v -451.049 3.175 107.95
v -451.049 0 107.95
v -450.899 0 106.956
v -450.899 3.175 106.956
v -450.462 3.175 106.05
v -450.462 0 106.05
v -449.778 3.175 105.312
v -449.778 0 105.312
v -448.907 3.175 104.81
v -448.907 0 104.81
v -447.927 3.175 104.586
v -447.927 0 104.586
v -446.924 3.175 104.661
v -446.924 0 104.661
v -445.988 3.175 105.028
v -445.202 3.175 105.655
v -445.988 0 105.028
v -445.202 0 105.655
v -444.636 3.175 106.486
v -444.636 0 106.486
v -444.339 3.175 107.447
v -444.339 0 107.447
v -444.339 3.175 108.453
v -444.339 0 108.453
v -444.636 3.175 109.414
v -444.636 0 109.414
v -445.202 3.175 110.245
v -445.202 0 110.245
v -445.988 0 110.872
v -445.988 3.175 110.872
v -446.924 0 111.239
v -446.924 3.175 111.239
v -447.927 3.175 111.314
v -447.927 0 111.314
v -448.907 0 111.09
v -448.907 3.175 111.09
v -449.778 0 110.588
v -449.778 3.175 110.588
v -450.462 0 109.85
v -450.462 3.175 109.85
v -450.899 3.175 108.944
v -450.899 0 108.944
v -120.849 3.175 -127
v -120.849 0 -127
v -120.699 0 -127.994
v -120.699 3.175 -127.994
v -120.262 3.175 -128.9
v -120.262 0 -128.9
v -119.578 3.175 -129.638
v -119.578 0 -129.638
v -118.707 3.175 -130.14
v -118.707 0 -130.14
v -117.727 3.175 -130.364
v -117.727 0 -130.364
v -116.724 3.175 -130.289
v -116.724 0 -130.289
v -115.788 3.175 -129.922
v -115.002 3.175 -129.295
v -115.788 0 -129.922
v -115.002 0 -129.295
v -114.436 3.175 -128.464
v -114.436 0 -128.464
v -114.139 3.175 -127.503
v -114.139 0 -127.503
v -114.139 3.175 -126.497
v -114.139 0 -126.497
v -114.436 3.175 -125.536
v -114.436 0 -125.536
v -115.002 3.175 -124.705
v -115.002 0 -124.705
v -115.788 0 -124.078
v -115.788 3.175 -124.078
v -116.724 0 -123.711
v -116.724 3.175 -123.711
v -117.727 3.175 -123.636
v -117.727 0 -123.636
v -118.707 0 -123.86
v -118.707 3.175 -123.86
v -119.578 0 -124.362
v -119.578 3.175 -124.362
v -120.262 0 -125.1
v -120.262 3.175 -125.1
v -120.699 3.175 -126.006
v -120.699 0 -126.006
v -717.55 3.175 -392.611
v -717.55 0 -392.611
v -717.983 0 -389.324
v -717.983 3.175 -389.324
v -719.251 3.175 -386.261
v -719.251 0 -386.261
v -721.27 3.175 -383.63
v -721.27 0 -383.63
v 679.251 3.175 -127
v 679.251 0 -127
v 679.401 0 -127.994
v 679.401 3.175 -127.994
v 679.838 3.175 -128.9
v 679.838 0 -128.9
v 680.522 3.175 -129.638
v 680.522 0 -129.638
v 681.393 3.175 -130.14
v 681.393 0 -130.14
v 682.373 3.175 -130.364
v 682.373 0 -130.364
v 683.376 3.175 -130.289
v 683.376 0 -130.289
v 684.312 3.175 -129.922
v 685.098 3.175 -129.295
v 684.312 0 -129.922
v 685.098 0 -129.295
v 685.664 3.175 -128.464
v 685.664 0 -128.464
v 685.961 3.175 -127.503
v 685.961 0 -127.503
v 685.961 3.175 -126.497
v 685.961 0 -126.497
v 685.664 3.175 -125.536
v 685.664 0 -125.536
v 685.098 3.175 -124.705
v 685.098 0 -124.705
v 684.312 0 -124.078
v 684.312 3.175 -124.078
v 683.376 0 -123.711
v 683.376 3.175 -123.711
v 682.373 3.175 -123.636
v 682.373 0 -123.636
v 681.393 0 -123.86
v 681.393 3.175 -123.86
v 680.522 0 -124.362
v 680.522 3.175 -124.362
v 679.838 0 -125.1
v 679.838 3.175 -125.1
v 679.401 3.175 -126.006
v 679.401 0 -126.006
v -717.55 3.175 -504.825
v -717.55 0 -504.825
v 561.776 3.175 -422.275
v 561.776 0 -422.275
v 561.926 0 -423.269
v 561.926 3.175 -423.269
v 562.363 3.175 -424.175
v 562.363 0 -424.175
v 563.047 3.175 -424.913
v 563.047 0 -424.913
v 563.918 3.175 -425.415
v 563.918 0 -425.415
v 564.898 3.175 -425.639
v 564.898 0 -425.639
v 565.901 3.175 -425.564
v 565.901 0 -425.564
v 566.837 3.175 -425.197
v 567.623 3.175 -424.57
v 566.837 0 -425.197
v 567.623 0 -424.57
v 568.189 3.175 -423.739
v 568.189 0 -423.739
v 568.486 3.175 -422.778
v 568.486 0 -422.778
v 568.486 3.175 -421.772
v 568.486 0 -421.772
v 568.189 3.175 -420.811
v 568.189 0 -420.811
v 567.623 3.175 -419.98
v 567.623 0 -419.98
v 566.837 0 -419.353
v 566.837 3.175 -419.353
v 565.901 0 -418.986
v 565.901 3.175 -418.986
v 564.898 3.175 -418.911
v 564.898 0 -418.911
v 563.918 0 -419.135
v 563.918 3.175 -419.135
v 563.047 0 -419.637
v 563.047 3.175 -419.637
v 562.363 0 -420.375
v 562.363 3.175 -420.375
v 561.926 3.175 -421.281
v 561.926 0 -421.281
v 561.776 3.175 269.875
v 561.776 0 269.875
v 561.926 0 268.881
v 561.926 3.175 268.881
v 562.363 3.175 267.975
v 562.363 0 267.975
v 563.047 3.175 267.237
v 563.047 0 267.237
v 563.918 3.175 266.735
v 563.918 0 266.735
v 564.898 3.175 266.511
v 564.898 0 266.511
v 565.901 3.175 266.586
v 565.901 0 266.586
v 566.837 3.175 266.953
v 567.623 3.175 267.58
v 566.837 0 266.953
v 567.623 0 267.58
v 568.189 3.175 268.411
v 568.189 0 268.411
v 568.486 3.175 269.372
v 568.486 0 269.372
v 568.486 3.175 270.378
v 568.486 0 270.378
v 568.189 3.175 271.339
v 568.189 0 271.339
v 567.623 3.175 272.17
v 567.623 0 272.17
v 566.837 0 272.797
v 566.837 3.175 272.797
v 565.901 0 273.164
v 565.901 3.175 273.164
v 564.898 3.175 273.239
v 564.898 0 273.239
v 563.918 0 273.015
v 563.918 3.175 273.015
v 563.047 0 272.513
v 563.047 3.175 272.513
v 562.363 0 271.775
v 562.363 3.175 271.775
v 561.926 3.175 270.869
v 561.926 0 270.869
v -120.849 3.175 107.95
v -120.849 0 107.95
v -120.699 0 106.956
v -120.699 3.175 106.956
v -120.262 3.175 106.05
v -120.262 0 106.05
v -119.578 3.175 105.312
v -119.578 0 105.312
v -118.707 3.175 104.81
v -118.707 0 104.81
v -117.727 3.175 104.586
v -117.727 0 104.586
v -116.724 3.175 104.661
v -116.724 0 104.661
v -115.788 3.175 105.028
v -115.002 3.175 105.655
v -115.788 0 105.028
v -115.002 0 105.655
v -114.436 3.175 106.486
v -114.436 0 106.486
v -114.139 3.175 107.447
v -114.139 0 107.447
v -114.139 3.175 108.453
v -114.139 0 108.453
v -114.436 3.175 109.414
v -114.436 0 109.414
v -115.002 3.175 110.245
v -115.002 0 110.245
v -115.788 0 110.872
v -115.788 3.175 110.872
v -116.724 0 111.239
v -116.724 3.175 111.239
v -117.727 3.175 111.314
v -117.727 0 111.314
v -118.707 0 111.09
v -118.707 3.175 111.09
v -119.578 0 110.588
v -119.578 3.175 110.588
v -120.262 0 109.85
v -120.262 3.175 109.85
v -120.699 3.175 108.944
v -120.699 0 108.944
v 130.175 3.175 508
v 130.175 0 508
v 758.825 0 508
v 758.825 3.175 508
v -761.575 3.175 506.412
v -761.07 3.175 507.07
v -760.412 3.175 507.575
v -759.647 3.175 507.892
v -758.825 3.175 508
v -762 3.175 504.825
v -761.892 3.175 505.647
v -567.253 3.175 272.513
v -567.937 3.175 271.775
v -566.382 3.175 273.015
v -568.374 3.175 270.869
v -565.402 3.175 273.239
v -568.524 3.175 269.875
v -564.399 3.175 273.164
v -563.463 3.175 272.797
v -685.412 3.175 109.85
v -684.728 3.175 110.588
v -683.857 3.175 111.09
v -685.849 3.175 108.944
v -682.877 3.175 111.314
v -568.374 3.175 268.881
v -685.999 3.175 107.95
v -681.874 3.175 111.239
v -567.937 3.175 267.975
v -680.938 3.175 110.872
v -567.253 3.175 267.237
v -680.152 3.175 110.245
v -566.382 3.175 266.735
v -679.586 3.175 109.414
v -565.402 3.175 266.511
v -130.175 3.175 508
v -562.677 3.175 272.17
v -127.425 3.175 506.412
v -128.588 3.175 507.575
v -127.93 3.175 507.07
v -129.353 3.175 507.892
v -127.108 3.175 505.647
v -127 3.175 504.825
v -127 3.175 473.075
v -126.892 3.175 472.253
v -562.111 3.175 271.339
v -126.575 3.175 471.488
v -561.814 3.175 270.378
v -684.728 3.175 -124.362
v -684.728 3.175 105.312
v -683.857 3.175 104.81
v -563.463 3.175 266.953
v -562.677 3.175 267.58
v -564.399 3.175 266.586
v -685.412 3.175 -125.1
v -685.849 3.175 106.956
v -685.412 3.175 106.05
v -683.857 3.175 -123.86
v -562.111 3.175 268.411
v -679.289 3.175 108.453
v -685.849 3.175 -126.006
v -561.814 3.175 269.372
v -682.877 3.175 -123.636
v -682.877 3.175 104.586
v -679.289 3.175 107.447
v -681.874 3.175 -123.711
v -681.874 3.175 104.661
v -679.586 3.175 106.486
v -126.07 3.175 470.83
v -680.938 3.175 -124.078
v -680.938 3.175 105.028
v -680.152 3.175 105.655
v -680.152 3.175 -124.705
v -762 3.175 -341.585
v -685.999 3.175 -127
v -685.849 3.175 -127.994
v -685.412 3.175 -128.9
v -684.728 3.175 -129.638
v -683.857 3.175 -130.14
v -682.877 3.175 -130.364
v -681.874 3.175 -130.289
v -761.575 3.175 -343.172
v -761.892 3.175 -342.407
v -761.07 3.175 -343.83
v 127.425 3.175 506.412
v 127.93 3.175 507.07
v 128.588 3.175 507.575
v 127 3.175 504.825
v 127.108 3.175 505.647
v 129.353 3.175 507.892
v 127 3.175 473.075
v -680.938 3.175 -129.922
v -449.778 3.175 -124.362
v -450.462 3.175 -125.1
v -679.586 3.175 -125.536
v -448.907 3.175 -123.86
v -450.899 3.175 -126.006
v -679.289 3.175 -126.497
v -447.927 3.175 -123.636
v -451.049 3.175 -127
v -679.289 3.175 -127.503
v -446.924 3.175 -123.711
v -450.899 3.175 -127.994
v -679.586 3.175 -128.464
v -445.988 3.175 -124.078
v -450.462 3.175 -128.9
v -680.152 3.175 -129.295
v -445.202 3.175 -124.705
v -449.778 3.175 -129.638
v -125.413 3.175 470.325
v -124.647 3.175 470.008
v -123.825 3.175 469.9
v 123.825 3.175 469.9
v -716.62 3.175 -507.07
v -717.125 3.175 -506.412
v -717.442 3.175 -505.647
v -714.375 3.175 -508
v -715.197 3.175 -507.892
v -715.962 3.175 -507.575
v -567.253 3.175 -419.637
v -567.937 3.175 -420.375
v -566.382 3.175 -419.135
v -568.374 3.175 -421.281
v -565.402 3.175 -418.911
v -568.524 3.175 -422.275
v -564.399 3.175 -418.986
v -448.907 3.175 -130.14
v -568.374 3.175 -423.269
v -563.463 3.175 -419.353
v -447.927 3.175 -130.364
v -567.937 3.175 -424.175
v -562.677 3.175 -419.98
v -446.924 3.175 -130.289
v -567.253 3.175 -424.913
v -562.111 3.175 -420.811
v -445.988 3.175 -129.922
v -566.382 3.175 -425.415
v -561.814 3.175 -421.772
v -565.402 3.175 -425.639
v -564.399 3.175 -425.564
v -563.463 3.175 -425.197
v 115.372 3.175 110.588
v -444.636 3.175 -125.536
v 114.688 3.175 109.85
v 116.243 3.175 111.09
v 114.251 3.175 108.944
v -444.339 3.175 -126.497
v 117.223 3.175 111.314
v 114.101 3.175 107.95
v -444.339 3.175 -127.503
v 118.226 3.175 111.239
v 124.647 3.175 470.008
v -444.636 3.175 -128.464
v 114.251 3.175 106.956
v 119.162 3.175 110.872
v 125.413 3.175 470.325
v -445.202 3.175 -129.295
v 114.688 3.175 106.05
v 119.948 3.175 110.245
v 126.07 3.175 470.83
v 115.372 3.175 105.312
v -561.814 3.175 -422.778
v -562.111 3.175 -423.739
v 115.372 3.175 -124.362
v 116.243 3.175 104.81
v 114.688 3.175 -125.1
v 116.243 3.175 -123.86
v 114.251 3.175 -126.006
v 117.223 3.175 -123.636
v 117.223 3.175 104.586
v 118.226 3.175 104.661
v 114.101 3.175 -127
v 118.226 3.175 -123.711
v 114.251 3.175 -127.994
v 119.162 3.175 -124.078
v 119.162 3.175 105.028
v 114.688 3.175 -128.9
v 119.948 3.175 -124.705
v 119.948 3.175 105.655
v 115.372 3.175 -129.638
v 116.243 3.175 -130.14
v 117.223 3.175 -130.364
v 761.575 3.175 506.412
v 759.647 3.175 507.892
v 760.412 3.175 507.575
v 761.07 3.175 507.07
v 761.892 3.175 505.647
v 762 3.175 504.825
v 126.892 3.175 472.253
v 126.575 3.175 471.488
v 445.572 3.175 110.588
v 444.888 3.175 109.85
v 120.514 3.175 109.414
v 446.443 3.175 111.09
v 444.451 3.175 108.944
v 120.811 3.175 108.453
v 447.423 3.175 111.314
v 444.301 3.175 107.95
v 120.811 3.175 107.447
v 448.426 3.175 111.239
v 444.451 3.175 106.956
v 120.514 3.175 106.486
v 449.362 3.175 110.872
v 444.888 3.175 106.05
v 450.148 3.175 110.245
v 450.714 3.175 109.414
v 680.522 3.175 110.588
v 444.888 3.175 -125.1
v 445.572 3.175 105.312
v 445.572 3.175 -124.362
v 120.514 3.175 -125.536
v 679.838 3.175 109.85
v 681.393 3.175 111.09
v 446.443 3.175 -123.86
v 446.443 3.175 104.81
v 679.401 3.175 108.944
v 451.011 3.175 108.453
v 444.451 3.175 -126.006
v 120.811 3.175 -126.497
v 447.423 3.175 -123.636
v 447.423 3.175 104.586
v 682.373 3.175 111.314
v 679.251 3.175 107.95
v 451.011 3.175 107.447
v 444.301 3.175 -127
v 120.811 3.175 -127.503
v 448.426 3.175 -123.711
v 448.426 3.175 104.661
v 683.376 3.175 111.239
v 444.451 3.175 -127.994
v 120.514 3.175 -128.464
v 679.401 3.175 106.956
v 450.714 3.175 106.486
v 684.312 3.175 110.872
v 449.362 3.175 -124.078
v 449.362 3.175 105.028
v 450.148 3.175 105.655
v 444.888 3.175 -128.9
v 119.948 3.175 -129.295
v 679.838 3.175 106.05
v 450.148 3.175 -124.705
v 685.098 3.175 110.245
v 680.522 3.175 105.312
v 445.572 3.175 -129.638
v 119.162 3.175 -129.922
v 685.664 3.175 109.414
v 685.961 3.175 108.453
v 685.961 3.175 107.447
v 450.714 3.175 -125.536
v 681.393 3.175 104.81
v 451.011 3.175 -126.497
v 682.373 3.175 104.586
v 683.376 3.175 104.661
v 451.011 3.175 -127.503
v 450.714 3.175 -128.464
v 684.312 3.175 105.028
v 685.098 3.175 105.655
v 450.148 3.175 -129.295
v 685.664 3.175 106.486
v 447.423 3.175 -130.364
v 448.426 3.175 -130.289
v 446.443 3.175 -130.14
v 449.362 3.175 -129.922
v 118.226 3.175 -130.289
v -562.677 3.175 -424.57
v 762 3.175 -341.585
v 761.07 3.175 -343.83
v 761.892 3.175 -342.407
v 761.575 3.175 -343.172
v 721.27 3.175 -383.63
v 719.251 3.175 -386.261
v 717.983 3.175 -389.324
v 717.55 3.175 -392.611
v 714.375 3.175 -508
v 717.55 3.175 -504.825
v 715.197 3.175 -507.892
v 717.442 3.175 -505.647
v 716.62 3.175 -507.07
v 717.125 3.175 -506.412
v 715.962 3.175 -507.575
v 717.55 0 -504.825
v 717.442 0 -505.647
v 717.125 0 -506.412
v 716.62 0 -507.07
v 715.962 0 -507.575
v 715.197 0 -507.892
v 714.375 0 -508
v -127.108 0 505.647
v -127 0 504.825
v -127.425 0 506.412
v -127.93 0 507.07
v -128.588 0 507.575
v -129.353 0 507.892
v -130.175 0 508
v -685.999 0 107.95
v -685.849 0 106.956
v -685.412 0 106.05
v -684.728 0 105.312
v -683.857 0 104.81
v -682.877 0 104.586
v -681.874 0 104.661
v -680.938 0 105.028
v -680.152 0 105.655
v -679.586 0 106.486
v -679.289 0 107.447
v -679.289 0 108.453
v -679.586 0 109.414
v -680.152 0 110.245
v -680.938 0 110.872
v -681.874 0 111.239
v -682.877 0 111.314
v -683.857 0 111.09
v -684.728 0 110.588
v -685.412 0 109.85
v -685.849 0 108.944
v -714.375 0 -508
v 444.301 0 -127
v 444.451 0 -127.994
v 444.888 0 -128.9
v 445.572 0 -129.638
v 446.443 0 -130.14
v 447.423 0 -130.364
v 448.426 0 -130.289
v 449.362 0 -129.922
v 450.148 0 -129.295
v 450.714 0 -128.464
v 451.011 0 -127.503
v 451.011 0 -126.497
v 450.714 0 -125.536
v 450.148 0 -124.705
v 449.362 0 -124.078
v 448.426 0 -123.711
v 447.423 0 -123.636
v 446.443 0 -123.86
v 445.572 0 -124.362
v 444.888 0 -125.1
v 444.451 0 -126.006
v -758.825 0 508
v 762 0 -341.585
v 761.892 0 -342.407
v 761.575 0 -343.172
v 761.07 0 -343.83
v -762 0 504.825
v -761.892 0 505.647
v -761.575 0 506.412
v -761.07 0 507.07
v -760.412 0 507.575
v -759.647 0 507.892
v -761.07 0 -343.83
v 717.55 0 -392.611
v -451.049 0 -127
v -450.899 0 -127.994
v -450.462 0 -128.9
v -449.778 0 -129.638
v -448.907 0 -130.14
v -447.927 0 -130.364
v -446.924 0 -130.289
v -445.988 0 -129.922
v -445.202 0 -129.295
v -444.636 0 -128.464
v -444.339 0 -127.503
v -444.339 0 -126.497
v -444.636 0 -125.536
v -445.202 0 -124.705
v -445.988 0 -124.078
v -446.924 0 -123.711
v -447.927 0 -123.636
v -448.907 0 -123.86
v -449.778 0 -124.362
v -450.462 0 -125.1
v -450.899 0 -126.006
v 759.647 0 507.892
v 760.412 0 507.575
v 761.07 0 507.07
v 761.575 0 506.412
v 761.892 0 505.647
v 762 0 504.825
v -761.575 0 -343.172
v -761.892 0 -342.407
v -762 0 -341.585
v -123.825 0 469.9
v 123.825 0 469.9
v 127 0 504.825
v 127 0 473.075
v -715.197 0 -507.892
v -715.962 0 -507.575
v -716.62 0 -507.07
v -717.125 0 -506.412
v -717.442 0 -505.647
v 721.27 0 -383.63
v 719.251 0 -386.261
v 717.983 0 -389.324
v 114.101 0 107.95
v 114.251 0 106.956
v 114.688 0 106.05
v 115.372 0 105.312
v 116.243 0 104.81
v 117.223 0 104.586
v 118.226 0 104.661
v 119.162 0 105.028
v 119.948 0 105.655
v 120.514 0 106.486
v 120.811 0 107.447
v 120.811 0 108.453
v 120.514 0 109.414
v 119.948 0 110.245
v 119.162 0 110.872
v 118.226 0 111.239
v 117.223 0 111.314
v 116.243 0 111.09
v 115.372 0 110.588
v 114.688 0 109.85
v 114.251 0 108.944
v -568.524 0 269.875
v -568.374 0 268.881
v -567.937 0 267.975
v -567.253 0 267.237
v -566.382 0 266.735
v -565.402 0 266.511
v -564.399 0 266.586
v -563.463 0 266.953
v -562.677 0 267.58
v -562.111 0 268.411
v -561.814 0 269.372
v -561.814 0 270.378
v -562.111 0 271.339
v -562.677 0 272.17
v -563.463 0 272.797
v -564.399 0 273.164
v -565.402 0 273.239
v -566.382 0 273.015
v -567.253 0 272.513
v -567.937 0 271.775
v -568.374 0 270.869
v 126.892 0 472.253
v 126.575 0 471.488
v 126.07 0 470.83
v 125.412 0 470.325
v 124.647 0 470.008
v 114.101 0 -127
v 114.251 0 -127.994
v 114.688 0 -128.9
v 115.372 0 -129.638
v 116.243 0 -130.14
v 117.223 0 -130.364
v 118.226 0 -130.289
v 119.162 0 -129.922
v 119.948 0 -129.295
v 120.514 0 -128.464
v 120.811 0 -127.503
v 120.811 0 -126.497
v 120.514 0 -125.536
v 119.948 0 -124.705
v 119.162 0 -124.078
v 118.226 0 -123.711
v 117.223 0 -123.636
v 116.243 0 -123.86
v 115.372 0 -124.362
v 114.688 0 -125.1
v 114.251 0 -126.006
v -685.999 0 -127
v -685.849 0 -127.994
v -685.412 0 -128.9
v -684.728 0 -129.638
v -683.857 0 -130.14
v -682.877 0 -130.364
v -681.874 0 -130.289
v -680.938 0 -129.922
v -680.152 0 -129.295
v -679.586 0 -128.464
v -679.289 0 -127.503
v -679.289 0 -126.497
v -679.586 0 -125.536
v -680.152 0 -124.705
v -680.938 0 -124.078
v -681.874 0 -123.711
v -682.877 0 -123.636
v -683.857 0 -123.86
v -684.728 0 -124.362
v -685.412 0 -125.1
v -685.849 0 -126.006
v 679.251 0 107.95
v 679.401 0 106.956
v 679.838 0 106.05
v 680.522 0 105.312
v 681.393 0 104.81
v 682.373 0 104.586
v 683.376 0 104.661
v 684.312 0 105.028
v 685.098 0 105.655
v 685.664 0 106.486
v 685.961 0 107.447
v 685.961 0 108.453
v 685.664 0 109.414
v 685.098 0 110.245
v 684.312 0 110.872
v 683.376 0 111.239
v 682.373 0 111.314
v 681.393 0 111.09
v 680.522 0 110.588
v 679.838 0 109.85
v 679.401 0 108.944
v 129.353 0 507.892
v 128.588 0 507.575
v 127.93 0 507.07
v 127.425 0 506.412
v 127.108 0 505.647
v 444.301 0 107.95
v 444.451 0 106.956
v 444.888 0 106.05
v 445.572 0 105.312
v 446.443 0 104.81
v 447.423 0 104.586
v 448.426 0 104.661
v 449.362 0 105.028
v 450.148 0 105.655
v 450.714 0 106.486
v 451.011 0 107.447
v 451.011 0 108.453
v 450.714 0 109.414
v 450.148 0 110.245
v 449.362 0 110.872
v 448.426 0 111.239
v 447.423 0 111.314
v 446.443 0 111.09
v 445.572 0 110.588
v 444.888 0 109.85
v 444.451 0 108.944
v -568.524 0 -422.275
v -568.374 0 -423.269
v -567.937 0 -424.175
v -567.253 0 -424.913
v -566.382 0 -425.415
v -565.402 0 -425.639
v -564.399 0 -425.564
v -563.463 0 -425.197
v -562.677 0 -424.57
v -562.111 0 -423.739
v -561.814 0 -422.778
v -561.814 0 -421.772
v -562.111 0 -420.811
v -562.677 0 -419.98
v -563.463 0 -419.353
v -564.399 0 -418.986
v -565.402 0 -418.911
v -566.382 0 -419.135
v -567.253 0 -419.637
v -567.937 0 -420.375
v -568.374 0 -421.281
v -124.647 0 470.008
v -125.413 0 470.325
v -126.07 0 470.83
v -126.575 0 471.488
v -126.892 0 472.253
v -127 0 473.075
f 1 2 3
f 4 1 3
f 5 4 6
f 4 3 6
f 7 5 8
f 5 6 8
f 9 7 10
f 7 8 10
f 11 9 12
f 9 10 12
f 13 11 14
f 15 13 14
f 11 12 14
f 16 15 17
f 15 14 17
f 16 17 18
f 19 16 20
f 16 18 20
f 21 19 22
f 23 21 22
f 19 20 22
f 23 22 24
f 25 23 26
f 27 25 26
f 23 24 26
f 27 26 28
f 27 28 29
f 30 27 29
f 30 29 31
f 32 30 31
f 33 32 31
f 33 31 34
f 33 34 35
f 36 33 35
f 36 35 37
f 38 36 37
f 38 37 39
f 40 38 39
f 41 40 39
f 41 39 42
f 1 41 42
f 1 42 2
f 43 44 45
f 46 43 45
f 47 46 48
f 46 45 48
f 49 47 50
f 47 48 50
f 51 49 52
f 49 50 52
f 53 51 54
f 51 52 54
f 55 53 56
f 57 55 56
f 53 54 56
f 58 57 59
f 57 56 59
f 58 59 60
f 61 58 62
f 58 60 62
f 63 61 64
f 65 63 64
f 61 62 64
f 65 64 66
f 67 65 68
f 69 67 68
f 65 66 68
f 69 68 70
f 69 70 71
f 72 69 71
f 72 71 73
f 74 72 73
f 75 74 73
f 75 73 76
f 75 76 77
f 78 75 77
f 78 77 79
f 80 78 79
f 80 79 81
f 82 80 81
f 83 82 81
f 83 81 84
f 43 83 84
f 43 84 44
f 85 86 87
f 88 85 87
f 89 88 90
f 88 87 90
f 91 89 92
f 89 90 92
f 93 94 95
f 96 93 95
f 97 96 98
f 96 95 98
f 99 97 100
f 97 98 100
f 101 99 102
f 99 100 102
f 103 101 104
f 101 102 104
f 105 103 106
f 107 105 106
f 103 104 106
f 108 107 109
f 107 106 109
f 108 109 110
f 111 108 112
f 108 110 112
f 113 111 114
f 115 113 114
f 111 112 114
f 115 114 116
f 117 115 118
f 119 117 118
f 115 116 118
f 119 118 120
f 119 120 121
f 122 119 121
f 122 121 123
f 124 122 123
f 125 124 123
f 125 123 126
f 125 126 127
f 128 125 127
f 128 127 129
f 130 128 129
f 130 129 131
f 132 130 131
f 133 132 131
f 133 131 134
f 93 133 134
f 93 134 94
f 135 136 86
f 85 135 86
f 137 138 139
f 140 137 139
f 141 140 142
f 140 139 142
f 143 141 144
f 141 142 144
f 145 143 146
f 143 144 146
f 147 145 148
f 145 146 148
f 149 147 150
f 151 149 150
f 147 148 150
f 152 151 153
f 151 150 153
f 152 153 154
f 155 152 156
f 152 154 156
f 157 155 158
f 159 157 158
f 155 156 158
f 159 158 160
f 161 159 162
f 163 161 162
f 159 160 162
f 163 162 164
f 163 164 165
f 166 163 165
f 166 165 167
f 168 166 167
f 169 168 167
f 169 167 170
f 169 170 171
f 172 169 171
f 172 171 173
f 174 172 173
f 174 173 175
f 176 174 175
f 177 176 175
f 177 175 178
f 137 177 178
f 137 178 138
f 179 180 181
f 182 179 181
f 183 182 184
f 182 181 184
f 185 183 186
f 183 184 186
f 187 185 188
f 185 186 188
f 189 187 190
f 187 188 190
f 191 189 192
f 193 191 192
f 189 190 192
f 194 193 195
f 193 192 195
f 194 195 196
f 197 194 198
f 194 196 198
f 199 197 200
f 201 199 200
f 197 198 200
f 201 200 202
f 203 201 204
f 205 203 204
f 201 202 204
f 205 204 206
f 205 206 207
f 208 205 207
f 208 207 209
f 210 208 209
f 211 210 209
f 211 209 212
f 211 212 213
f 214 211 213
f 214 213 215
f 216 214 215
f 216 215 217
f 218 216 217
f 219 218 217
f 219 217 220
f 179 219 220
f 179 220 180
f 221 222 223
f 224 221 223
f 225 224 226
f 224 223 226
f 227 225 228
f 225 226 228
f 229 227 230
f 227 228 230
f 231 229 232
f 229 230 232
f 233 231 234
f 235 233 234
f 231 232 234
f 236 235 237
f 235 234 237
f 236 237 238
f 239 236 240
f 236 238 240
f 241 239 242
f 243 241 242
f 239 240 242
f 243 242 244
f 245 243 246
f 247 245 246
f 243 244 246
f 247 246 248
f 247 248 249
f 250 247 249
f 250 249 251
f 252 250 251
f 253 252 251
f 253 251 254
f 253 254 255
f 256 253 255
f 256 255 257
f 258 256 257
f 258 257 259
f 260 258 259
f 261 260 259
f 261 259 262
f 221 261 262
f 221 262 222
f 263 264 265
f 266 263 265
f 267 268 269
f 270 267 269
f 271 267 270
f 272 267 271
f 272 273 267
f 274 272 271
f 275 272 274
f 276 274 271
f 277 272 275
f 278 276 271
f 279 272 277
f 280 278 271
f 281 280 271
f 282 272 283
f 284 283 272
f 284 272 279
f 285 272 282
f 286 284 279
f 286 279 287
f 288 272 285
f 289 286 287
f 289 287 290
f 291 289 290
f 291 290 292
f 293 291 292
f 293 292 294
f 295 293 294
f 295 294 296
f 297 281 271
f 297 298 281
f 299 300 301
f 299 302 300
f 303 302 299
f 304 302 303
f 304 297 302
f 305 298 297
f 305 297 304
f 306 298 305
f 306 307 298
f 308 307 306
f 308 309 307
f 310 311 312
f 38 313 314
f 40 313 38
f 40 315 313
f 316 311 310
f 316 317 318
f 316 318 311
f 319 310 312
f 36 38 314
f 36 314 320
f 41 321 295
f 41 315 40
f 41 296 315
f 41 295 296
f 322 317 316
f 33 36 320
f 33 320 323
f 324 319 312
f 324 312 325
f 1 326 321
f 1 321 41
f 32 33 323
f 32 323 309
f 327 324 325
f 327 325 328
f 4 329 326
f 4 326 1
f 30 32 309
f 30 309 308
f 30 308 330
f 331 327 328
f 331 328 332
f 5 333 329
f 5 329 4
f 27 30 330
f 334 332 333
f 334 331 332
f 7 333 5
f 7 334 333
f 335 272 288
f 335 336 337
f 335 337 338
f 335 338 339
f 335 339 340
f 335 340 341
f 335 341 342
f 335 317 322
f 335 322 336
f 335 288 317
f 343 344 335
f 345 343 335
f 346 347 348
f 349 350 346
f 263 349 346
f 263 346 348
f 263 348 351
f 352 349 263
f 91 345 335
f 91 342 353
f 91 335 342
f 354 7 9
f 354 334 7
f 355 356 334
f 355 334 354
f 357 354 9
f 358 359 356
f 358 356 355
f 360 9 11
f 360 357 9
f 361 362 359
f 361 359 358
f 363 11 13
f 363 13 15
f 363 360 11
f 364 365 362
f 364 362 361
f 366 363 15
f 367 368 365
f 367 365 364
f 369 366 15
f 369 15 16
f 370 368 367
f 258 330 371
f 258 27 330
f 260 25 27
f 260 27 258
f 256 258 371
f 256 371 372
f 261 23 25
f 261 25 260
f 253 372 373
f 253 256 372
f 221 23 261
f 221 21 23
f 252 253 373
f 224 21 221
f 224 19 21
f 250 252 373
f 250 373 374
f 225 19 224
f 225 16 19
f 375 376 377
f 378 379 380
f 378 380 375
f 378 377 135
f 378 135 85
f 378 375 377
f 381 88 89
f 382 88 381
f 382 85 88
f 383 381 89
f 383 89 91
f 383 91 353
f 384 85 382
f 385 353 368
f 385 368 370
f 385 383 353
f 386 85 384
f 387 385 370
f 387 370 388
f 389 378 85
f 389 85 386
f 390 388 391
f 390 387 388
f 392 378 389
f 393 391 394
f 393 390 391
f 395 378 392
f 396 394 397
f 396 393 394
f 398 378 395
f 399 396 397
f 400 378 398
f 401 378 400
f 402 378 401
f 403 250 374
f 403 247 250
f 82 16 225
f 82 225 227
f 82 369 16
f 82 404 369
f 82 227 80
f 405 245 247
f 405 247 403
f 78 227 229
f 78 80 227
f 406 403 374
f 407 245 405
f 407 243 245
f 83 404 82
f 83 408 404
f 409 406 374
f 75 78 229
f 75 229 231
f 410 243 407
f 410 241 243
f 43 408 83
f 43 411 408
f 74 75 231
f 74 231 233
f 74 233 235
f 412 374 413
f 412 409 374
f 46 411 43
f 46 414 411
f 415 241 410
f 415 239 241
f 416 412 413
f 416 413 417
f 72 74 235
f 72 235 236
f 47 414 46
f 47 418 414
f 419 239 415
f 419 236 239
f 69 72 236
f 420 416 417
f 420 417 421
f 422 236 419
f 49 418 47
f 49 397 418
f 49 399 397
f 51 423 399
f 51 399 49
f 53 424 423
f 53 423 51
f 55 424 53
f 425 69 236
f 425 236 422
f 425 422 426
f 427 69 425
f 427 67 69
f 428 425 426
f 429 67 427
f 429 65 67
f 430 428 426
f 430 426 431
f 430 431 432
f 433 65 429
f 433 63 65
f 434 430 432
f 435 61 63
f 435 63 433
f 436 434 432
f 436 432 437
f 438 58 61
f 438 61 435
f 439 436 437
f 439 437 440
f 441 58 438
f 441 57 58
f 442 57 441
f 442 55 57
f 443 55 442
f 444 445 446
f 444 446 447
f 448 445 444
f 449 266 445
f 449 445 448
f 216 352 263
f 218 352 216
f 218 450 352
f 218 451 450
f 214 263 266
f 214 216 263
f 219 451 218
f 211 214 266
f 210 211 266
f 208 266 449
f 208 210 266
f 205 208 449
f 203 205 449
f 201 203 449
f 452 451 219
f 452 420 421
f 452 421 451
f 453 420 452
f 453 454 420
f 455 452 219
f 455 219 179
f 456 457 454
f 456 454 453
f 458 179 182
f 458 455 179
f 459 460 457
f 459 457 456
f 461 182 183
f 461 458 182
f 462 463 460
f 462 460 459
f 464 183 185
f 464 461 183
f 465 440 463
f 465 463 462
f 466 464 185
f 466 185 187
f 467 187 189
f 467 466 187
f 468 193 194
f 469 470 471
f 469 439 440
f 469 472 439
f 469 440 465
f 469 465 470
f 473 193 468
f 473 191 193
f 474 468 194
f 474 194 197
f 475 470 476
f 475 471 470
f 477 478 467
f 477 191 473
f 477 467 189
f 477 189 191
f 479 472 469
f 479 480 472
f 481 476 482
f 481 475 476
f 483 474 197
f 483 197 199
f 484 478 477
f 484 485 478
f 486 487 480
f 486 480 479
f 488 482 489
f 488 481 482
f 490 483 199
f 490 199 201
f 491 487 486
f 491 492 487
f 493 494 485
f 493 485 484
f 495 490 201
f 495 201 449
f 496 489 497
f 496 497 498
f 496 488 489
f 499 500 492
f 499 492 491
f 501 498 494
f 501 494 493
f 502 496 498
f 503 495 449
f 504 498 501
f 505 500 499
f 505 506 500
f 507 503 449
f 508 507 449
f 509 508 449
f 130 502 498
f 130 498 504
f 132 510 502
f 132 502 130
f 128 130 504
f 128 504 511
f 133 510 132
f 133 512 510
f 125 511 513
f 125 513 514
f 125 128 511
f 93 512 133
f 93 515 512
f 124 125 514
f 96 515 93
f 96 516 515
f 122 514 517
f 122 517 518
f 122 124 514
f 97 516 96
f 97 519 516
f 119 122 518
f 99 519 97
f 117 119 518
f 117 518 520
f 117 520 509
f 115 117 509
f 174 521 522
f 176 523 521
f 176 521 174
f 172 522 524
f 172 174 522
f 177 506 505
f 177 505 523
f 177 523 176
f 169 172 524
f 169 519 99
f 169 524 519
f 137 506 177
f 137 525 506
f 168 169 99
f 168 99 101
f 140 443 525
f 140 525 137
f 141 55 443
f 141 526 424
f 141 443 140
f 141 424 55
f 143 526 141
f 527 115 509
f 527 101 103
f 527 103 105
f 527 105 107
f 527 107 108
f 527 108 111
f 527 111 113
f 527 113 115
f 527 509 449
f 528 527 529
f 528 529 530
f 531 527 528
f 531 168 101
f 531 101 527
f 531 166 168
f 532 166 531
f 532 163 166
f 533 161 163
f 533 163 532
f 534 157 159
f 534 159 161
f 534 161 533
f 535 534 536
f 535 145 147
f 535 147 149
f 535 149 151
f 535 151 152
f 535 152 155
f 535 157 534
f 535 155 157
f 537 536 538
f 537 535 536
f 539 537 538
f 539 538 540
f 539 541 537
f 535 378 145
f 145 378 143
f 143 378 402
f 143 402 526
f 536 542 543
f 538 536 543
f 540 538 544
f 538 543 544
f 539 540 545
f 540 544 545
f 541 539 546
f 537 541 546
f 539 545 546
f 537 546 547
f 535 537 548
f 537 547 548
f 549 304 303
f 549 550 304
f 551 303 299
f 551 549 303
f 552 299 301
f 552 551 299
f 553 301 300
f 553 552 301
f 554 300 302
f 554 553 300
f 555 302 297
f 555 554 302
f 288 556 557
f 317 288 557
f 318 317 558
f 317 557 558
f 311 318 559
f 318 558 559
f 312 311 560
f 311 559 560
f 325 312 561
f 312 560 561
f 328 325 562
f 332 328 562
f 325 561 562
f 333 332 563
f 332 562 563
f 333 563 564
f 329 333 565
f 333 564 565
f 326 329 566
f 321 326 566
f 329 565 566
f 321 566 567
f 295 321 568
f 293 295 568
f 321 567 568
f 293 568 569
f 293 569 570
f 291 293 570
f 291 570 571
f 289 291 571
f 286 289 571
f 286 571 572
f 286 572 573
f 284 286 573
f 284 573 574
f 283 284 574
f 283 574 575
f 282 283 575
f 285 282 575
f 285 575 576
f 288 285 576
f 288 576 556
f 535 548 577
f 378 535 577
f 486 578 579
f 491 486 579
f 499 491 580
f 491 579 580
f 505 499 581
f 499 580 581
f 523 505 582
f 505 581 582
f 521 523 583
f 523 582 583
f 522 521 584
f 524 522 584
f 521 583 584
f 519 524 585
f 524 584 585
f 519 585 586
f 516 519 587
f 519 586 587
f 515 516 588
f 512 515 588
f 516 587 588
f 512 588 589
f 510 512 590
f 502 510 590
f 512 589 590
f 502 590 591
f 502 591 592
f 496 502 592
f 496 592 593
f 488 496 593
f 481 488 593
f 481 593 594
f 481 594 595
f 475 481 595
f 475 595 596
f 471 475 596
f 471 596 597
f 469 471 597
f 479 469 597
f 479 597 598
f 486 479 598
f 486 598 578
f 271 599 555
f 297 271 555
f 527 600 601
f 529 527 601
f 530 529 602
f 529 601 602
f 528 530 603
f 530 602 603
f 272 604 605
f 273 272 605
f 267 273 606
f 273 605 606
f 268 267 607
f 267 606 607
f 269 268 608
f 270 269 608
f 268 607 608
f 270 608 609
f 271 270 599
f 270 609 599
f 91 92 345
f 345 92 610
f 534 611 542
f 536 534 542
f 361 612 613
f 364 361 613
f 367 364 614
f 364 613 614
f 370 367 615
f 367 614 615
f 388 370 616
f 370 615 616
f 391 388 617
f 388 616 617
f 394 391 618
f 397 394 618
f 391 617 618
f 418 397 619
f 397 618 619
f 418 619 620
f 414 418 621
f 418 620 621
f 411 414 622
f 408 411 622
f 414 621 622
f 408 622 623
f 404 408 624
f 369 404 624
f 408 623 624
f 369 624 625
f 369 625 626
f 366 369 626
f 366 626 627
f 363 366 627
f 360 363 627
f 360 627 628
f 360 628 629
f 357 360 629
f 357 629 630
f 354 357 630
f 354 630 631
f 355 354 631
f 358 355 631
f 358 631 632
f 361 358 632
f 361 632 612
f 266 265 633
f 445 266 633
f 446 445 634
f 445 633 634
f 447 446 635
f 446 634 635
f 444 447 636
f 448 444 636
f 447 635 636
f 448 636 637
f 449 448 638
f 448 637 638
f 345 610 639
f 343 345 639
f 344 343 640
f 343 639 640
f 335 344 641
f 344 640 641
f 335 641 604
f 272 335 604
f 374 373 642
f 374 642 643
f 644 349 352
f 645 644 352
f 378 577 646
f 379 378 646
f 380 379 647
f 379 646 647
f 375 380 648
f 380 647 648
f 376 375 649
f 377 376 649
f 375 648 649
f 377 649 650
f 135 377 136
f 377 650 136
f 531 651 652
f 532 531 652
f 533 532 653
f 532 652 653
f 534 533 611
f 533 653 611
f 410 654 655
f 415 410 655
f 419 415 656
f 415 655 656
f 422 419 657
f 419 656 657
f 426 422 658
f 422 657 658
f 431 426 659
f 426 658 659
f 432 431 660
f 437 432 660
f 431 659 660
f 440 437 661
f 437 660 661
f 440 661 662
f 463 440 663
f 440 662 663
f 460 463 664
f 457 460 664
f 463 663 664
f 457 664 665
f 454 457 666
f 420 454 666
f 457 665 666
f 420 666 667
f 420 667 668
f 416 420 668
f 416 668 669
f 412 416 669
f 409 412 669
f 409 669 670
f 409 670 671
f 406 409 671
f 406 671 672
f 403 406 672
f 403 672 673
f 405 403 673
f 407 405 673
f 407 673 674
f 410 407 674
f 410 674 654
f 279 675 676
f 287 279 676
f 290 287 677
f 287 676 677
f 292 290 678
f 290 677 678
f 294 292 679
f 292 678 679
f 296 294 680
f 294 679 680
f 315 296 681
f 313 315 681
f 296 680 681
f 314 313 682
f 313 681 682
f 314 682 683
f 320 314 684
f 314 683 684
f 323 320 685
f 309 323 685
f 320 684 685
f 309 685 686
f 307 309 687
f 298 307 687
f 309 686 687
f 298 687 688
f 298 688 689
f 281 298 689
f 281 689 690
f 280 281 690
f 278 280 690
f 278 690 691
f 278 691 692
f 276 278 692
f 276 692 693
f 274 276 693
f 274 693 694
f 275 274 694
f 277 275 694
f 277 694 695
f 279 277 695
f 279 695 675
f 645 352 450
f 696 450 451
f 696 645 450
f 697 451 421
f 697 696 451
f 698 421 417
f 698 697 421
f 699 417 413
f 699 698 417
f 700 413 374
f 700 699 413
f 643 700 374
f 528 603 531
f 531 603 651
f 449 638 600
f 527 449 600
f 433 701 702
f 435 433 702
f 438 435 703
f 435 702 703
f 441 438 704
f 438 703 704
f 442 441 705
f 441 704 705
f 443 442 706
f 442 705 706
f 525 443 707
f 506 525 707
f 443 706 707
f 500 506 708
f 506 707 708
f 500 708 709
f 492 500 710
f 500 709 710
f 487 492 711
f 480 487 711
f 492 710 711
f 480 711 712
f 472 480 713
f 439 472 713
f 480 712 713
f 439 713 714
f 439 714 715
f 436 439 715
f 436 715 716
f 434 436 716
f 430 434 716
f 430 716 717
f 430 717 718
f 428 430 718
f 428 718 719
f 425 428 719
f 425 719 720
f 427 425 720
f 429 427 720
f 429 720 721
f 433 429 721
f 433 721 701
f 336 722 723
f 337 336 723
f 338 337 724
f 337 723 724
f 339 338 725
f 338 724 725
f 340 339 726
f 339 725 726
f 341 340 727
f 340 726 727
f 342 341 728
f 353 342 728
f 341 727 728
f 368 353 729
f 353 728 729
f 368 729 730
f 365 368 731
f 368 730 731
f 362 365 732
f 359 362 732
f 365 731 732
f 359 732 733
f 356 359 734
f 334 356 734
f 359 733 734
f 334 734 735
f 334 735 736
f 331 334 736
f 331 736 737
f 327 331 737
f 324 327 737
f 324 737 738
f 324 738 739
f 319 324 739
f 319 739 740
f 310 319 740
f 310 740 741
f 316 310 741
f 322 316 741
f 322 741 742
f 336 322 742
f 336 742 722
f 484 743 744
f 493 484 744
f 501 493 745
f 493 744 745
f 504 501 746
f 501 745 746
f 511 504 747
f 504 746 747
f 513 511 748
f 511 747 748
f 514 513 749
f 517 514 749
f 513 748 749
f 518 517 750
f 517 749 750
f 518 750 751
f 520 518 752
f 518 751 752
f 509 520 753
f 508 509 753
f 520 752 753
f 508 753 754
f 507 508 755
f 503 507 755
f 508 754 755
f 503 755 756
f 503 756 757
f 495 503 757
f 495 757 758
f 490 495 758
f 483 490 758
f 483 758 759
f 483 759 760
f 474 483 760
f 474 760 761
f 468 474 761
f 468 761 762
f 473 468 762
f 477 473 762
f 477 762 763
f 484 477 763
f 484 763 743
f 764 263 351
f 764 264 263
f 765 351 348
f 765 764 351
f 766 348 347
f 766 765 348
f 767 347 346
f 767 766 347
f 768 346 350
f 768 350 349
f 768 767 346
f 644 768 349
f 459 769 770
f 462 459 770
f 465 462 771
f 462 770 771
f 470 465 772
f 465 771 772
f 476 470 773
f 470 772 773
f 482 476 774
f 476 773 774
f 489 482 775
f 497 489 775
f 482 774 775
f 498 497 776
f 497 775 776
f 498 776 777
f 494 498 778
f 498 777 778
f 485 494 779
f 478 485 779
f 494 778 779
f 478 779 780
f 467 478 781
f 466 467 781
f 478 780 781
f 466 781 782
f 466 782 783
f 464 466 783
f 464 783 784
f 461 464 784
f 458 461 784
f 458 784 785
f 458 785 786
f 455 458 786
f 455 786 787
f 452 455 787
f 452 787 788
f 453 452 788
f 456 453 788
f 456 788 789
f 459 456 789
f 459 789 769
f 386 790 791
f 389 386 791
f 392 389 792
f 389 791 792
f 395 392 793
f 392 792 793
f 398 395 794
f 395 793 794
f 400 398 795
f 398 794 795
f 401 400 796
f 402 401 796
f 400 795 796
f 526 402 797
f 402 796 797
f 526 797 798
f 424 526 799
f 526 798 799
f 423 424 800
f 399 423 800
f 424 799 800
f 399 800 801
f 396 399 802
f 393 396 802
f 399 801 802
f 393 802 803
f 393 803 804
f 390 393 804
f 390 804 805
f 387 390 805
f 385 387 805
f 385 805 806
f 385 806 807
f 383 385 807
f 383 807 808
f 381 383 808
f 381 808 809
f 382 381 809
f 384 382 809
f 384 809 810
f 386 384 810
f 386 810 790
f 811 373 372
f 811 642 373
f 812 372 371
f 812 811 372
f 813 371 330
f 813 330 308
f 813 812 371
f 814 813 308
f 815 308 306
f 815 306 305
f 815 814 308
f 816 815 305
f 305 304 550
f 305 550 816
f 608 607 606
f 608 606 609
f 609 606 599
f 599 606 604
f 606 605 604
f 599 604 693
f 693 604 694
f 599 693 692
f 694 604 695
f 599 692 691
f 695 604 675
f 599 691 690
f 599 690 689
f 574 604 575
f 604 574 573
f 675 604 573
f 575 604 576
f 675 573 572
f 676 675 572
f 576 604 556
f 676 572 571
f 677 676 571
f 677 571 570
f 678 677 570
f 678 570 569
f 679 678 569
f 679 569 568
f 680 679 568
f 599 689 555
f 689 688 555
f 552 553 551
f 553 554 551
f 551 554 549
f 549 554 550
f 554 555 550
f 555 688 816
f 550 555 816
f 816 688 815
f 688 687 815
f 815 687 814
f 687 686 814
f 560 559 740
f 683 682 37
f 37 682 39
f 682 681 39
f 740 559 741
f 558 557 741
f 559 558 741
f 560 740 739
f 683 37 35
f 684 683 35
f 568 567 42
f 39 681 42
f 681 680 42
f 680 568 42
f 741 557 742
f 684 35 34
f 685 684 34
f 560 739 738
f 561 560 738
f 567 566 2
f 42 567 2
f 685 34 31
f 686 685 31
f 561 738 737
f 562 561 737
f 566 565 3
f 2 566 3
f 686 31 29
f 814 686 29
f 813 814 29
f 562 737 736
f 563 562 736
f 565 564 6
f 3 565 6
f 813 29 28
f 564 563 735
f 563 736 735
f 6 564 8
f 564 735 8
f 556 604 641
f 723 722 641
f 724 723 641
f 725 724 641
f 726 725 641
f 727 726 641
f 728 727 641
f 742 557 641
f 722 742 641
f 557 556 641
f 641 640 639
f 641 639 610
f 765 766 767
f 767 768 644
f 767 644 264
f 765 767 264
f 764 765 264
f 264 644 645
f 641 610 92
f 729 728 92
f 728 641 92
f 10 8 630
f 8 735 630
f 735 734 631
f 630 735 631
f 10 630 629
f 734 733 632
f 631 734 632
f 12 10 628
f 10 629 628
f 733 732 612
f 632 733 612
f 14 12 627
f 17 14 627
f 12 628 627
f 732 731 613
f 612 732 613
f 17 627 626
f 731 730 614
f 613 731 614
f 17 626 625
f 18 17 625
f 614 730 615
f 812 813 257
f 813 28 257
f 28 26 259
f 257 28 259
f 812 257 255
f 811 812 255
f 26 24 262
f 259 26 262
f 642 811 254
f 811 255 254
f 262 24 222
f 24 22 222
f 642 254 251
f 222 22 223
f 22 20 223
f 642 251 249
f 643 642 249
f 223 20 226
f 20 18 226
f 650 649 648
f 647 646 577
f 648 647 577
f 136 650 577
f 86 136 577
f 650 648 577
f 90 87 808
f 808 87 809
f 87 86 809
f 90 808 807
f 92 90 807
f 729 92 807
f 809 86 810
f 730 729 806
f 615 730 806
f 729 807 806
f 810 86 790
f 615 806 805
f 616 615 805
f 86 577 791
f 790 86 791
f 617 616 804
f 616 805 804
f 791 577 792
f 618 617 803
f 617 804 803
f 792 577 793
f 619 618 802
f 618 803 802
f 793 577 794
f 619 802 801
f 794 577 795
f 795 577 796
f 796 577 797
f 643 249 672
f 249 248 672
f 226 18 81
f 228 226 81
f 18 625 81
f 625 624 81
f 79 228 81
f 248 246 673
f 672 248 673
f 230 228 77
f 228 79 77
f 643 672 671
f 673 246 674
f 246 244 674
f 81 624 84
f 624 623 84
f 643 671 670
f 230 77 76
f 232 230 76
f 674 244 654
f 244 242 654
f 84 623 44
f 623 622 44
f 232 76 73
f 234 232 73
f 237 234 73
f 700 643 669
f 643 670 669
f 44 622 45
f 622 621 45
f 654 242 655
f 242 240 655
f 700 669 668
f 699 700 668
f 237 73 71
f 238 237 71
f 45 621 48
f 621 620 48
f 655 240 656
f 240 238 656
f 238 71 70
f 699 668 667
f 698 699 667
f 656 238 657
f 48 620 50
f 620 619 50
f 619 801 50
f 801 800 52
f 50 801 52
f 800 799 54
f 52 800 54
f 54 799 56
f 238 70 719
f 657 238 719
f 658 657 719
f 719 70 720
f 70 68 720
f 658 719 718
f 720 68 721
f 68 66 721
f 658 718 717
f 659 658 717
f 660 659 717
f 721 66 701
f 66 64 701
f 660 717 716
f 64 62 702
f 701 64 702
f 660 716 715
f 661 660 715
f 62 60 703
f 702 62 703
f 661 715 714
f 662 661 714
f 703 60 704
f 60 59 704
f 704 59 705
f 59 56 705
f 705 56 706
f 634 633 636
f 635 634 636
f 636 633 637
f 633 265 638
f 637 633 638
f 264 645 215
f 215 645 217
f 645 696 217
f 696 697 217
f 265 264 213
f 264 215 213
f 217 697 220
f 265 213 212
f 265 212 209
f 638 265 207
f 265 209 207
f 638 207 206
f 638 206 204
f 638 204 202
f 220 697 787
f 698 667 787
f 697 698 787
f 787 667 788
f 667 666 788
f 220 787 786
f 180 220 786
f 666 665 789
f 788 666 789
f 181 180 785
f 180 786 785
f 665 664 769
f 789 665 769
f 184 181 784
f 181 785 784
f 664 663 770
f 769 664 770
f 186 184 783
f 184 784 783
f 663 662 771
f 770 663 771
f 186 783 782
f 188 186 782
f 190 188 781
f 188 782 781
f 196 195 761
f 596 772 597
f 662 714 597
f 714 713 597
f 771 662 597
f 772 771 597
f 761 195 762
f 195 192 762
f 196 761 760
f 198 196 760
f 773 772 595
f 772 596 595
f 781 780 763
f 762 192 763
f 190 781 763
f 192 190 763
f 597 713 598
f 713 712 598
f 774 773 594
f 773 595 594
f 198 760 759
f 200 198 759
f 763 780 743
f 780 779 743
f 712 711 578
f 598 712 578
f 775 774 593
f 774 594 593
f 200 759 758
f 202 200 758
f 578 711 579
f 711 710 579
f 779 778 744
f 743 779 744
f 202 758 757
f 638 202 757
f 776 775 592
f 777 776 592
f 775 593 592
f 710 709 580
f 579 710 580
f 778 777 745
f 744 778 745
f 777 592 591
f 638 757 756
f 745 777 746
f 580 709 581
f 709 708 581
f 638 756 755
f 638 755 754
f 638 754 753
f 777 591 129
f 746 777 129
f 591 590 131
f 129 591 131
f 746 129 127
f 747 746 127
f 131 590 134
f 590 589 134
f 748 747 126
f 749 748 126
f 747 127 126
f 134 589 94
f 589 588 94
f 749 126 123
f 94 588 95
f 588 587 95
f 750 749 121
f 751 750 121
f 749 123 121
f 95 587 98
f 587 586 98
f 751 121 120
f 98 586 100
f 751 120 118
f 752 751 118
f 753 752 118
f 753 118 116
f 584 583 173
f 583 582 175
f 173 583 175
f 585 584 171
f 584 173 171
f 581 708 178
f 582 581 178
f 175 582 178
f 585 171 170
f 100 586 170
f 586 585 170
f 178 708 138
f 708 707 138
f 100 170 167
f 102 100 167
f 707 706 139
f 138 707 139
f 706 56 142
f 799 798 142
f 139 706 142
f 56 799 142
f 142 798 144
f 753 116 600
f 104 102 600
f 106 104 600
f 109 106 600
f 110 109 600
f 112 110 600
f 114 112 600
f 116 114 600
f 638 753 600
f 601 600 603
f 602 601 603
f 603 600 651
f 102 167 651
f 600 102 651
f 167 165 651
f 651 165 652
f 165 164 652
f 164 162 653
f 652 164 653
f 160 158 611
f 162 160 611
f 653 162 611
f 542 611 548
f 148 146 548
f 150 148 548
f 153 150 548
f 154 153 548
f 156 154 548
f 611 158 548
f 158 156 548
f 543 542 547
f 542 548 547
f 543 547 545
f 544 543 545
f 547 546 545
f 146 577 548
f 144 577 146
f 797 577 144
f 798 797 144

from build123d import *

# Parameters (mm, degrees)
BOSS_EXTRUDE1_DEPTH              = 3.175
F_17_64_0_26563_DIAMETER_HOLE1_D = 6.747002
SKETCH5_W                        = 254
SKETCH5_H                        = 38.1
CUT_EXTRUDE1_DEPTH               = 916.815527617
FILLET1_R                        = 3.175


with BuildPart() as part:
    # Sketch1 → Boss-Extrude1 (new body)
    with BuildSketch(Plane(origin=(0, 0, 0), x_dir=(1, 0, 0), z_dir=(0, 1, 0))):
        with BuildLine():
            Line((-717.55, 504.825), (-717.55, 392.610512242))
            ThreePointArc((-717.55, 392.610512242), (-718.516729937, 387.750432651), (-721.269743879, 383.630256121))
            Line((-721.269743879, 383.630256121), (-761.07006403, 343.82993597))
            ThreePointArc((-761.07006403, 343.82993597), (-761.758317516, 342.799891837), (-762, 341.584871939))
            Line((-762, 341.584871939), (-762, -504.825))
            ThreePointArc((-762, -504.825), (-761.07006403, -507.07006403), (-758.825, -508))
            Line((-758.825, -508), (758.825, -508))
            ThreePointArc((758.825, -508), (761.07006403, -507.07006403), (762, -504.825))
            Line((762, -504.825), (762, 341.584871939))
            ThreePointArc((762, 341.584871939), (761.758317516, 342.799891837), (761.07006403, 343.82993597))
            Line((761.07006403, 343.82993597), (721.269743879, 383.630256121))
            ThreePointArc((721.269743879, 383.630256121), (718.516729937, 387.750432651), (717.55, 392.610512242))
            Line((717.55, 392.610512242), (717.55, 504.825))
            ThreePointArc((717.55, 504.825), (716.62006403, 507.07006403), (714.375, 508))
            Line((714.375, 508), (-714.375, 508))
            ThreePointArc((-714.375, 508), (-716.62006403, 507.07006403), (-717.55, 504.825))
        make_face()
    extrude(amount=BOSS_EXTRUDE1_DEPTH)

    # 17/64 (0.26563) Diameter Hole1 (through all)
    with Locations(Plane(origin=(0, 3.175, 0), x_dir=(1, 0, 0), z_dir=(0, 1, 0))):
        with Locations((-565.15, 422.275), (565.15, 422.275), (565.15, -269.875), (-565.15, -269.875), (-682.625, 127), (-447.675, 127), (-682.625, -107.95), (-447.675, -107.95), (-117.475, 127), (117.475, 127), (-117.475, -107.95), (117.475, -107.95), (447.675, 127), (682.625, 127), (447.675, -107.95), (682.625, -107.95)):
            Hole(F_17_64_0_26563_DIAMETER_HOLE1_D / 2)

    # Sketch5 → Cut-Extrude1 (cut, through all)
    with BuildSketch(Plane(origin=(0, 3.175, 0), x_dir=(1, 0, 0), z_dir=(0, 1, 0))):
        with Locations((0, -488.95)):
            Rectangle(SKETCH5_W, SKETCH5_H)
    extrude(amount=-CUT_EXTRUDE1_DEPTH, mode=Mode.SUBTRACT)

    # Fillet1
    fillet1_edges = [part.edges().sort_by_distance(p)[0] for p in [
        (-127, 1.5875, 508),
        (-127, 1.5875, 469.9),
        (127, 1.5875, 469.9),
        (127, 1.5875, 508),
    ]]
    fillet(fillet1_edges, radius=FILLET1_R)


solid = part.part
